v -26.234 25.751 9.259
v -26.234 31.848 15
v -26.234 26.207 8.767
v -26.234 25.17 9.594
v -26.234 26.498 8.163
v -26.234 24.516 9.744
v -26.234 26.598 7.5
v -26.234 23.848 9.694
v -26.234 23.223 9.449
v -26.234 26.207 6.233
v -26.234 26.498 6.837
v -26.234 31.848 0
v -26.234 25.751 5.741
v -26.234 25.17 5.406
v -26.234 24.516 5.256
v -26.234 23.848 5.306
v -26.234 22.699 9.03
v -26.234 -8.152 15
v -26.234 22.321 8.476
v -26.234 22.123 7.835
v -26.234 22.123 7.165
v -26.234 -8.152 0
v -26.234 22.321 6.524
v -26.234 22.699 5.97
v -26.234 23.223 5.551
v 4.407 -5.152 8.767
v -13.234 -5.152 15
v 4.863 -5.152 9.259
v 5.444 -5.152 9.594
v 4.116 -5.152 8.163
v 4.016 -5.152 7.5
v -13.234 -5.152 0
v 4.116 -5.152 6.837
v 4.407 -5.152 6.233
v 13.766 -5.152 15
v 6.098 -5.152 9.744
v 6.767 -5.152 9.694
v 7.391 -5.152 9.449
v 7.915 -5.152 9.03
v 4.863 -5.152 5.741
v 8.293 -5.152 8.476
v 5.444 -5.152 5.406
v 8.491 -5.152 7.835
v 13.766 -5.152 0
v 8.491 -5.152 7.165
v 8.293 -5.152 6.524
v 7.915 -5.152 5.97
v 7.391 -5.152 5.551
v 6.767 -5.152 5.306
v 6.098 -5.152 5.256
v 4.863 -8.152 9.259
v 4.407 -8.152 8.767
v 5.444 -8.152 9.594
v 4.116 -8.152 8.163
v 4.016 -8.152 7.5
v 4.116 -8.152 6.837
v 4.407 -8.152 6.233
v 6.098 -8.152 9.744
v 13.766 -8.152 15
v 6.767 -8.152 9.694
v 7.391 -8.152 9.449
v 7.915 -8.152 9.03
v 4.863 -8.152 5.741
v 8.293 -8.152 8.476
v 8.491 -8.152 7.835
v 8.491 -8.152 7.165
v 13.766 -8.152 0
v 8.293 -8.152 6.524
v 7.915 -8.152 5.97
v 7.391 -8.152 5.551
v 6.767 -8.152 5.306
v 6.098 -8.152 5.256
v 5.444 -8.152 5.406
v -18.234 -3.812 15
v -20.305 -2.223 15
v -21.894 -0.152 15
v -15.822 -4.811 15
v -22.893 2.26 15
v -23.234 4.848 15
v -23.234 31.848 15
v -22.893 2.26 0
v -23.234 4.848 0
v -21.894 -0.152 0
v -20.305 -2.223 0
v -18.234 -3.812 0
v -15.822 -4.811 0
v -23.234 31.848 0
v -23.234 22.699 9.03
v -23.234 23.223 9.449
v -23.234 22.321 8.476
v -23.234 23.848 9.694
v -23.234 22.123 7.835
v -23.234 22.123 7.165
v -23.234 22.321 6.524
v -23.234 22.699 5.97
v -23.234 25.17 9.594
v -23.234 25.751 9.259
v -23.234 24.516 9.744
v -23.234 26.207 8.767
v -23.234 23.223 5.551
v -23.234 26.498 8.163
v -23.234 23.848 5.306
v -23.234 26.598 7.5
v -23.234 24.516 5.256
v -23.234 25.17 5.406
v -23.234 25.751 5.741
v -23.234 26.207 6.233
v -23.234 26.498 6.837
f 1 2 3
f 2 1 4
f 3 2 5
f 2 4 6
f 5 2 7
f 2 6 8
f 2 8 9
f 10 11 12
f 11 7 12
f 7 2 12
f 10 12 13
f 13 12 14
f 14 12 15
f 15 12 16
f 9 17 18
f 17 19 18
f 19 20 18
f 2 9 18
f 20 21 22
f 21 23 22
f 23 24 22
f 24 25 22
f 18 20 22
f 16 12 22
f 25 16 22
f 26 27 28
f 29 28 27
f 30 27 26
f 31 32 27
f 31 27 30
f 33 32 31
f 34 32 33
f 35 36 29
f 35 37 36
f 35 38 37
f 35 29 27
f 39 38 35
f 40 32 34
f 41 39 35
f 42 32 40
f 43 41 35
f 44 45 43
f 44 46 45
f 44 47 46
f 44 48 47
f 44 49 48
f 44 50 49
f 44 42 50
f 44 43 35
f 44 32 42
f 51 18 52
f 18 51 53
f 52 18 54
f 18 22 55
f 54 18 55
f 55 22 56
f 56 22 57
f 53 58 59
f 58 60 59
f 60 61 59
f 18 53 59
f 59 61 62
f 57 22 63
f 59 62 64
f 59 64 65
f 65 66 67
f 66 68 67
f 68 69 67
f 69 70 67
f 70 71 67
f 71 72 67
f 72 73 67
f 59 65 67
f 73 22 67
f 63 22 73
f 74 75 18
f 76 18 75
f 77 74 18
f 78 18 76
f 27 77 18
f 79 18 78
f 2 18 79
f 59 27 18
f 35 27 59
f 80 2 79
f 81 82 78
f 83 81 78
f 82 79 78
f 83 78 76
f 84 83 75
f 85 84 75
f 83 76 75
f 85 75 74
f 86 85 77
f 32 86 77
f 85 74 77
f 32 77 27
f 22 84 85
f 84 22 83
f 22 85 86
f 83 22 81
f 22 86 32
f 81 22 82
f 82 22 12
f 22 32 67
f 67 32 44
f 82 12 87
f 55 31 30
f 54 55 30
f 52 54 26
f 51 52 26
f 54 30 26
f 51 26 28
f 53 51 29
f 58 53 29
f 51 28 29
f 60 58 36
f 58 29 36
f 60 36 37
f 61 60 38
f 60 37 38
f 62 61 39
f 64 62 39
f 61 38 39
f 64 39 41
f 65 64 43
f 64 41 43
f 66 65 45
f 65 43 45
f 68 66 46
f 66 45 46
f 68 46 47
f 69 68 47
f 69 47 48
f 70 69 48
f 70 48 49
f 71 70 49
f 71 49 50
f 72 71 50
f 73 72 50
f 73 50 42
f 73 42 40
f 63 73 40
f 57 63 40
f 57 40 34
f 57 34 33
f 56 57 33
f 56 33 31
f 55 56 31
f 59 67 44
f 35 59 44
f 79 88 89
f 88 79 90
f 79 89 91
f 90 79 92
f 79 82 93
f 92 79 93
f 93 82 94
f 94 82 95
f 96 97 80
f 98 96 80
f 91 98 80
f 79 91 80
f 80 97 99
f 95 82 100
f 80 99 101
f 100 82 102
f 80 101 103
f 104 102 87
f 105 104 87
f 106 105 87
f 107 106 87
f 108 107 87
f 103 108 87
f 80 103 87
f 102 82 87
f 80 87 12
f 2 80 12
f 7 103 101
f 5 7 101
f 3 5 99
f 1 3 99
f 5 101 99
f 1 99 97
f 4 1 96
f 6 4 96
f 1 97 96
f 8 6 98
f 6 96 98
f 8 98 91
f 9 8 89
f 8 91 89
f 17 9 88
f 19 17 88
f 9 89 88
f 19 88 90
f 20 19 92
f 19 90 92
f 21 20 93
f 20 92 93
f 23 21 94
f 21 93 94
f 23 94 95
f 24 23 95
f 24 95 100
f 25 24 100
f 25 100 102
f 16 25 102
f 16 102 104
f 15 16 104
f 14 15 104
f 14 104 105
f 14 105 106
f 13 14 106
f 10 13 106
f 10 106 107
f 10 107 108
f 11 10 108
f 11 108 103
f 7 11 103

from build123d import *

# Parameters (mm, degrees)
F0_W     = 37
F0_H     = 3
F1_DEPTH = 15
F6_D     = 4.5
F7_D     = 4.5
F5_R     = 10


with BuildPart() as f1:
    # F0 (on Top) → F1 (new body)
    with BuildSketch(Plane.XY):
        Polygon((-23.234105, 31.848193), (-26.234105, 31.848193), (-26.234105, -8.151807), (-23.234105, -8.151807), (-23.234105, -5.151807), align=None)
        with Locations((-4.734105, -6.651807)):
            Rectangle(F0_W, F0_H)
    extrude(amount=F1_DEPTH)

    # F6 (through all)
    with Locations(Plane(origin=(-26.234105, 0, 0), x_dir=(0, -1, 0), z_dir=(-1, 0, 0))):
        with Locations((-24.348193, 7.5)):
            Hole(F6_D / 2)

    # F7 (through all)
    with Locations(Plane.XZ.offset(8.151807)):
        with Locations((6.265895, 7.5)):
            Hole(F7_D / 2)

    # F5
    f5_edges = [f1.edges().sort_by_distance(p)[0] for p in [
        (-23.234105, -5.151807, 7.5),
    ]]
    fillet(f5_edges, radius=F5_R)


solid = f1.part
